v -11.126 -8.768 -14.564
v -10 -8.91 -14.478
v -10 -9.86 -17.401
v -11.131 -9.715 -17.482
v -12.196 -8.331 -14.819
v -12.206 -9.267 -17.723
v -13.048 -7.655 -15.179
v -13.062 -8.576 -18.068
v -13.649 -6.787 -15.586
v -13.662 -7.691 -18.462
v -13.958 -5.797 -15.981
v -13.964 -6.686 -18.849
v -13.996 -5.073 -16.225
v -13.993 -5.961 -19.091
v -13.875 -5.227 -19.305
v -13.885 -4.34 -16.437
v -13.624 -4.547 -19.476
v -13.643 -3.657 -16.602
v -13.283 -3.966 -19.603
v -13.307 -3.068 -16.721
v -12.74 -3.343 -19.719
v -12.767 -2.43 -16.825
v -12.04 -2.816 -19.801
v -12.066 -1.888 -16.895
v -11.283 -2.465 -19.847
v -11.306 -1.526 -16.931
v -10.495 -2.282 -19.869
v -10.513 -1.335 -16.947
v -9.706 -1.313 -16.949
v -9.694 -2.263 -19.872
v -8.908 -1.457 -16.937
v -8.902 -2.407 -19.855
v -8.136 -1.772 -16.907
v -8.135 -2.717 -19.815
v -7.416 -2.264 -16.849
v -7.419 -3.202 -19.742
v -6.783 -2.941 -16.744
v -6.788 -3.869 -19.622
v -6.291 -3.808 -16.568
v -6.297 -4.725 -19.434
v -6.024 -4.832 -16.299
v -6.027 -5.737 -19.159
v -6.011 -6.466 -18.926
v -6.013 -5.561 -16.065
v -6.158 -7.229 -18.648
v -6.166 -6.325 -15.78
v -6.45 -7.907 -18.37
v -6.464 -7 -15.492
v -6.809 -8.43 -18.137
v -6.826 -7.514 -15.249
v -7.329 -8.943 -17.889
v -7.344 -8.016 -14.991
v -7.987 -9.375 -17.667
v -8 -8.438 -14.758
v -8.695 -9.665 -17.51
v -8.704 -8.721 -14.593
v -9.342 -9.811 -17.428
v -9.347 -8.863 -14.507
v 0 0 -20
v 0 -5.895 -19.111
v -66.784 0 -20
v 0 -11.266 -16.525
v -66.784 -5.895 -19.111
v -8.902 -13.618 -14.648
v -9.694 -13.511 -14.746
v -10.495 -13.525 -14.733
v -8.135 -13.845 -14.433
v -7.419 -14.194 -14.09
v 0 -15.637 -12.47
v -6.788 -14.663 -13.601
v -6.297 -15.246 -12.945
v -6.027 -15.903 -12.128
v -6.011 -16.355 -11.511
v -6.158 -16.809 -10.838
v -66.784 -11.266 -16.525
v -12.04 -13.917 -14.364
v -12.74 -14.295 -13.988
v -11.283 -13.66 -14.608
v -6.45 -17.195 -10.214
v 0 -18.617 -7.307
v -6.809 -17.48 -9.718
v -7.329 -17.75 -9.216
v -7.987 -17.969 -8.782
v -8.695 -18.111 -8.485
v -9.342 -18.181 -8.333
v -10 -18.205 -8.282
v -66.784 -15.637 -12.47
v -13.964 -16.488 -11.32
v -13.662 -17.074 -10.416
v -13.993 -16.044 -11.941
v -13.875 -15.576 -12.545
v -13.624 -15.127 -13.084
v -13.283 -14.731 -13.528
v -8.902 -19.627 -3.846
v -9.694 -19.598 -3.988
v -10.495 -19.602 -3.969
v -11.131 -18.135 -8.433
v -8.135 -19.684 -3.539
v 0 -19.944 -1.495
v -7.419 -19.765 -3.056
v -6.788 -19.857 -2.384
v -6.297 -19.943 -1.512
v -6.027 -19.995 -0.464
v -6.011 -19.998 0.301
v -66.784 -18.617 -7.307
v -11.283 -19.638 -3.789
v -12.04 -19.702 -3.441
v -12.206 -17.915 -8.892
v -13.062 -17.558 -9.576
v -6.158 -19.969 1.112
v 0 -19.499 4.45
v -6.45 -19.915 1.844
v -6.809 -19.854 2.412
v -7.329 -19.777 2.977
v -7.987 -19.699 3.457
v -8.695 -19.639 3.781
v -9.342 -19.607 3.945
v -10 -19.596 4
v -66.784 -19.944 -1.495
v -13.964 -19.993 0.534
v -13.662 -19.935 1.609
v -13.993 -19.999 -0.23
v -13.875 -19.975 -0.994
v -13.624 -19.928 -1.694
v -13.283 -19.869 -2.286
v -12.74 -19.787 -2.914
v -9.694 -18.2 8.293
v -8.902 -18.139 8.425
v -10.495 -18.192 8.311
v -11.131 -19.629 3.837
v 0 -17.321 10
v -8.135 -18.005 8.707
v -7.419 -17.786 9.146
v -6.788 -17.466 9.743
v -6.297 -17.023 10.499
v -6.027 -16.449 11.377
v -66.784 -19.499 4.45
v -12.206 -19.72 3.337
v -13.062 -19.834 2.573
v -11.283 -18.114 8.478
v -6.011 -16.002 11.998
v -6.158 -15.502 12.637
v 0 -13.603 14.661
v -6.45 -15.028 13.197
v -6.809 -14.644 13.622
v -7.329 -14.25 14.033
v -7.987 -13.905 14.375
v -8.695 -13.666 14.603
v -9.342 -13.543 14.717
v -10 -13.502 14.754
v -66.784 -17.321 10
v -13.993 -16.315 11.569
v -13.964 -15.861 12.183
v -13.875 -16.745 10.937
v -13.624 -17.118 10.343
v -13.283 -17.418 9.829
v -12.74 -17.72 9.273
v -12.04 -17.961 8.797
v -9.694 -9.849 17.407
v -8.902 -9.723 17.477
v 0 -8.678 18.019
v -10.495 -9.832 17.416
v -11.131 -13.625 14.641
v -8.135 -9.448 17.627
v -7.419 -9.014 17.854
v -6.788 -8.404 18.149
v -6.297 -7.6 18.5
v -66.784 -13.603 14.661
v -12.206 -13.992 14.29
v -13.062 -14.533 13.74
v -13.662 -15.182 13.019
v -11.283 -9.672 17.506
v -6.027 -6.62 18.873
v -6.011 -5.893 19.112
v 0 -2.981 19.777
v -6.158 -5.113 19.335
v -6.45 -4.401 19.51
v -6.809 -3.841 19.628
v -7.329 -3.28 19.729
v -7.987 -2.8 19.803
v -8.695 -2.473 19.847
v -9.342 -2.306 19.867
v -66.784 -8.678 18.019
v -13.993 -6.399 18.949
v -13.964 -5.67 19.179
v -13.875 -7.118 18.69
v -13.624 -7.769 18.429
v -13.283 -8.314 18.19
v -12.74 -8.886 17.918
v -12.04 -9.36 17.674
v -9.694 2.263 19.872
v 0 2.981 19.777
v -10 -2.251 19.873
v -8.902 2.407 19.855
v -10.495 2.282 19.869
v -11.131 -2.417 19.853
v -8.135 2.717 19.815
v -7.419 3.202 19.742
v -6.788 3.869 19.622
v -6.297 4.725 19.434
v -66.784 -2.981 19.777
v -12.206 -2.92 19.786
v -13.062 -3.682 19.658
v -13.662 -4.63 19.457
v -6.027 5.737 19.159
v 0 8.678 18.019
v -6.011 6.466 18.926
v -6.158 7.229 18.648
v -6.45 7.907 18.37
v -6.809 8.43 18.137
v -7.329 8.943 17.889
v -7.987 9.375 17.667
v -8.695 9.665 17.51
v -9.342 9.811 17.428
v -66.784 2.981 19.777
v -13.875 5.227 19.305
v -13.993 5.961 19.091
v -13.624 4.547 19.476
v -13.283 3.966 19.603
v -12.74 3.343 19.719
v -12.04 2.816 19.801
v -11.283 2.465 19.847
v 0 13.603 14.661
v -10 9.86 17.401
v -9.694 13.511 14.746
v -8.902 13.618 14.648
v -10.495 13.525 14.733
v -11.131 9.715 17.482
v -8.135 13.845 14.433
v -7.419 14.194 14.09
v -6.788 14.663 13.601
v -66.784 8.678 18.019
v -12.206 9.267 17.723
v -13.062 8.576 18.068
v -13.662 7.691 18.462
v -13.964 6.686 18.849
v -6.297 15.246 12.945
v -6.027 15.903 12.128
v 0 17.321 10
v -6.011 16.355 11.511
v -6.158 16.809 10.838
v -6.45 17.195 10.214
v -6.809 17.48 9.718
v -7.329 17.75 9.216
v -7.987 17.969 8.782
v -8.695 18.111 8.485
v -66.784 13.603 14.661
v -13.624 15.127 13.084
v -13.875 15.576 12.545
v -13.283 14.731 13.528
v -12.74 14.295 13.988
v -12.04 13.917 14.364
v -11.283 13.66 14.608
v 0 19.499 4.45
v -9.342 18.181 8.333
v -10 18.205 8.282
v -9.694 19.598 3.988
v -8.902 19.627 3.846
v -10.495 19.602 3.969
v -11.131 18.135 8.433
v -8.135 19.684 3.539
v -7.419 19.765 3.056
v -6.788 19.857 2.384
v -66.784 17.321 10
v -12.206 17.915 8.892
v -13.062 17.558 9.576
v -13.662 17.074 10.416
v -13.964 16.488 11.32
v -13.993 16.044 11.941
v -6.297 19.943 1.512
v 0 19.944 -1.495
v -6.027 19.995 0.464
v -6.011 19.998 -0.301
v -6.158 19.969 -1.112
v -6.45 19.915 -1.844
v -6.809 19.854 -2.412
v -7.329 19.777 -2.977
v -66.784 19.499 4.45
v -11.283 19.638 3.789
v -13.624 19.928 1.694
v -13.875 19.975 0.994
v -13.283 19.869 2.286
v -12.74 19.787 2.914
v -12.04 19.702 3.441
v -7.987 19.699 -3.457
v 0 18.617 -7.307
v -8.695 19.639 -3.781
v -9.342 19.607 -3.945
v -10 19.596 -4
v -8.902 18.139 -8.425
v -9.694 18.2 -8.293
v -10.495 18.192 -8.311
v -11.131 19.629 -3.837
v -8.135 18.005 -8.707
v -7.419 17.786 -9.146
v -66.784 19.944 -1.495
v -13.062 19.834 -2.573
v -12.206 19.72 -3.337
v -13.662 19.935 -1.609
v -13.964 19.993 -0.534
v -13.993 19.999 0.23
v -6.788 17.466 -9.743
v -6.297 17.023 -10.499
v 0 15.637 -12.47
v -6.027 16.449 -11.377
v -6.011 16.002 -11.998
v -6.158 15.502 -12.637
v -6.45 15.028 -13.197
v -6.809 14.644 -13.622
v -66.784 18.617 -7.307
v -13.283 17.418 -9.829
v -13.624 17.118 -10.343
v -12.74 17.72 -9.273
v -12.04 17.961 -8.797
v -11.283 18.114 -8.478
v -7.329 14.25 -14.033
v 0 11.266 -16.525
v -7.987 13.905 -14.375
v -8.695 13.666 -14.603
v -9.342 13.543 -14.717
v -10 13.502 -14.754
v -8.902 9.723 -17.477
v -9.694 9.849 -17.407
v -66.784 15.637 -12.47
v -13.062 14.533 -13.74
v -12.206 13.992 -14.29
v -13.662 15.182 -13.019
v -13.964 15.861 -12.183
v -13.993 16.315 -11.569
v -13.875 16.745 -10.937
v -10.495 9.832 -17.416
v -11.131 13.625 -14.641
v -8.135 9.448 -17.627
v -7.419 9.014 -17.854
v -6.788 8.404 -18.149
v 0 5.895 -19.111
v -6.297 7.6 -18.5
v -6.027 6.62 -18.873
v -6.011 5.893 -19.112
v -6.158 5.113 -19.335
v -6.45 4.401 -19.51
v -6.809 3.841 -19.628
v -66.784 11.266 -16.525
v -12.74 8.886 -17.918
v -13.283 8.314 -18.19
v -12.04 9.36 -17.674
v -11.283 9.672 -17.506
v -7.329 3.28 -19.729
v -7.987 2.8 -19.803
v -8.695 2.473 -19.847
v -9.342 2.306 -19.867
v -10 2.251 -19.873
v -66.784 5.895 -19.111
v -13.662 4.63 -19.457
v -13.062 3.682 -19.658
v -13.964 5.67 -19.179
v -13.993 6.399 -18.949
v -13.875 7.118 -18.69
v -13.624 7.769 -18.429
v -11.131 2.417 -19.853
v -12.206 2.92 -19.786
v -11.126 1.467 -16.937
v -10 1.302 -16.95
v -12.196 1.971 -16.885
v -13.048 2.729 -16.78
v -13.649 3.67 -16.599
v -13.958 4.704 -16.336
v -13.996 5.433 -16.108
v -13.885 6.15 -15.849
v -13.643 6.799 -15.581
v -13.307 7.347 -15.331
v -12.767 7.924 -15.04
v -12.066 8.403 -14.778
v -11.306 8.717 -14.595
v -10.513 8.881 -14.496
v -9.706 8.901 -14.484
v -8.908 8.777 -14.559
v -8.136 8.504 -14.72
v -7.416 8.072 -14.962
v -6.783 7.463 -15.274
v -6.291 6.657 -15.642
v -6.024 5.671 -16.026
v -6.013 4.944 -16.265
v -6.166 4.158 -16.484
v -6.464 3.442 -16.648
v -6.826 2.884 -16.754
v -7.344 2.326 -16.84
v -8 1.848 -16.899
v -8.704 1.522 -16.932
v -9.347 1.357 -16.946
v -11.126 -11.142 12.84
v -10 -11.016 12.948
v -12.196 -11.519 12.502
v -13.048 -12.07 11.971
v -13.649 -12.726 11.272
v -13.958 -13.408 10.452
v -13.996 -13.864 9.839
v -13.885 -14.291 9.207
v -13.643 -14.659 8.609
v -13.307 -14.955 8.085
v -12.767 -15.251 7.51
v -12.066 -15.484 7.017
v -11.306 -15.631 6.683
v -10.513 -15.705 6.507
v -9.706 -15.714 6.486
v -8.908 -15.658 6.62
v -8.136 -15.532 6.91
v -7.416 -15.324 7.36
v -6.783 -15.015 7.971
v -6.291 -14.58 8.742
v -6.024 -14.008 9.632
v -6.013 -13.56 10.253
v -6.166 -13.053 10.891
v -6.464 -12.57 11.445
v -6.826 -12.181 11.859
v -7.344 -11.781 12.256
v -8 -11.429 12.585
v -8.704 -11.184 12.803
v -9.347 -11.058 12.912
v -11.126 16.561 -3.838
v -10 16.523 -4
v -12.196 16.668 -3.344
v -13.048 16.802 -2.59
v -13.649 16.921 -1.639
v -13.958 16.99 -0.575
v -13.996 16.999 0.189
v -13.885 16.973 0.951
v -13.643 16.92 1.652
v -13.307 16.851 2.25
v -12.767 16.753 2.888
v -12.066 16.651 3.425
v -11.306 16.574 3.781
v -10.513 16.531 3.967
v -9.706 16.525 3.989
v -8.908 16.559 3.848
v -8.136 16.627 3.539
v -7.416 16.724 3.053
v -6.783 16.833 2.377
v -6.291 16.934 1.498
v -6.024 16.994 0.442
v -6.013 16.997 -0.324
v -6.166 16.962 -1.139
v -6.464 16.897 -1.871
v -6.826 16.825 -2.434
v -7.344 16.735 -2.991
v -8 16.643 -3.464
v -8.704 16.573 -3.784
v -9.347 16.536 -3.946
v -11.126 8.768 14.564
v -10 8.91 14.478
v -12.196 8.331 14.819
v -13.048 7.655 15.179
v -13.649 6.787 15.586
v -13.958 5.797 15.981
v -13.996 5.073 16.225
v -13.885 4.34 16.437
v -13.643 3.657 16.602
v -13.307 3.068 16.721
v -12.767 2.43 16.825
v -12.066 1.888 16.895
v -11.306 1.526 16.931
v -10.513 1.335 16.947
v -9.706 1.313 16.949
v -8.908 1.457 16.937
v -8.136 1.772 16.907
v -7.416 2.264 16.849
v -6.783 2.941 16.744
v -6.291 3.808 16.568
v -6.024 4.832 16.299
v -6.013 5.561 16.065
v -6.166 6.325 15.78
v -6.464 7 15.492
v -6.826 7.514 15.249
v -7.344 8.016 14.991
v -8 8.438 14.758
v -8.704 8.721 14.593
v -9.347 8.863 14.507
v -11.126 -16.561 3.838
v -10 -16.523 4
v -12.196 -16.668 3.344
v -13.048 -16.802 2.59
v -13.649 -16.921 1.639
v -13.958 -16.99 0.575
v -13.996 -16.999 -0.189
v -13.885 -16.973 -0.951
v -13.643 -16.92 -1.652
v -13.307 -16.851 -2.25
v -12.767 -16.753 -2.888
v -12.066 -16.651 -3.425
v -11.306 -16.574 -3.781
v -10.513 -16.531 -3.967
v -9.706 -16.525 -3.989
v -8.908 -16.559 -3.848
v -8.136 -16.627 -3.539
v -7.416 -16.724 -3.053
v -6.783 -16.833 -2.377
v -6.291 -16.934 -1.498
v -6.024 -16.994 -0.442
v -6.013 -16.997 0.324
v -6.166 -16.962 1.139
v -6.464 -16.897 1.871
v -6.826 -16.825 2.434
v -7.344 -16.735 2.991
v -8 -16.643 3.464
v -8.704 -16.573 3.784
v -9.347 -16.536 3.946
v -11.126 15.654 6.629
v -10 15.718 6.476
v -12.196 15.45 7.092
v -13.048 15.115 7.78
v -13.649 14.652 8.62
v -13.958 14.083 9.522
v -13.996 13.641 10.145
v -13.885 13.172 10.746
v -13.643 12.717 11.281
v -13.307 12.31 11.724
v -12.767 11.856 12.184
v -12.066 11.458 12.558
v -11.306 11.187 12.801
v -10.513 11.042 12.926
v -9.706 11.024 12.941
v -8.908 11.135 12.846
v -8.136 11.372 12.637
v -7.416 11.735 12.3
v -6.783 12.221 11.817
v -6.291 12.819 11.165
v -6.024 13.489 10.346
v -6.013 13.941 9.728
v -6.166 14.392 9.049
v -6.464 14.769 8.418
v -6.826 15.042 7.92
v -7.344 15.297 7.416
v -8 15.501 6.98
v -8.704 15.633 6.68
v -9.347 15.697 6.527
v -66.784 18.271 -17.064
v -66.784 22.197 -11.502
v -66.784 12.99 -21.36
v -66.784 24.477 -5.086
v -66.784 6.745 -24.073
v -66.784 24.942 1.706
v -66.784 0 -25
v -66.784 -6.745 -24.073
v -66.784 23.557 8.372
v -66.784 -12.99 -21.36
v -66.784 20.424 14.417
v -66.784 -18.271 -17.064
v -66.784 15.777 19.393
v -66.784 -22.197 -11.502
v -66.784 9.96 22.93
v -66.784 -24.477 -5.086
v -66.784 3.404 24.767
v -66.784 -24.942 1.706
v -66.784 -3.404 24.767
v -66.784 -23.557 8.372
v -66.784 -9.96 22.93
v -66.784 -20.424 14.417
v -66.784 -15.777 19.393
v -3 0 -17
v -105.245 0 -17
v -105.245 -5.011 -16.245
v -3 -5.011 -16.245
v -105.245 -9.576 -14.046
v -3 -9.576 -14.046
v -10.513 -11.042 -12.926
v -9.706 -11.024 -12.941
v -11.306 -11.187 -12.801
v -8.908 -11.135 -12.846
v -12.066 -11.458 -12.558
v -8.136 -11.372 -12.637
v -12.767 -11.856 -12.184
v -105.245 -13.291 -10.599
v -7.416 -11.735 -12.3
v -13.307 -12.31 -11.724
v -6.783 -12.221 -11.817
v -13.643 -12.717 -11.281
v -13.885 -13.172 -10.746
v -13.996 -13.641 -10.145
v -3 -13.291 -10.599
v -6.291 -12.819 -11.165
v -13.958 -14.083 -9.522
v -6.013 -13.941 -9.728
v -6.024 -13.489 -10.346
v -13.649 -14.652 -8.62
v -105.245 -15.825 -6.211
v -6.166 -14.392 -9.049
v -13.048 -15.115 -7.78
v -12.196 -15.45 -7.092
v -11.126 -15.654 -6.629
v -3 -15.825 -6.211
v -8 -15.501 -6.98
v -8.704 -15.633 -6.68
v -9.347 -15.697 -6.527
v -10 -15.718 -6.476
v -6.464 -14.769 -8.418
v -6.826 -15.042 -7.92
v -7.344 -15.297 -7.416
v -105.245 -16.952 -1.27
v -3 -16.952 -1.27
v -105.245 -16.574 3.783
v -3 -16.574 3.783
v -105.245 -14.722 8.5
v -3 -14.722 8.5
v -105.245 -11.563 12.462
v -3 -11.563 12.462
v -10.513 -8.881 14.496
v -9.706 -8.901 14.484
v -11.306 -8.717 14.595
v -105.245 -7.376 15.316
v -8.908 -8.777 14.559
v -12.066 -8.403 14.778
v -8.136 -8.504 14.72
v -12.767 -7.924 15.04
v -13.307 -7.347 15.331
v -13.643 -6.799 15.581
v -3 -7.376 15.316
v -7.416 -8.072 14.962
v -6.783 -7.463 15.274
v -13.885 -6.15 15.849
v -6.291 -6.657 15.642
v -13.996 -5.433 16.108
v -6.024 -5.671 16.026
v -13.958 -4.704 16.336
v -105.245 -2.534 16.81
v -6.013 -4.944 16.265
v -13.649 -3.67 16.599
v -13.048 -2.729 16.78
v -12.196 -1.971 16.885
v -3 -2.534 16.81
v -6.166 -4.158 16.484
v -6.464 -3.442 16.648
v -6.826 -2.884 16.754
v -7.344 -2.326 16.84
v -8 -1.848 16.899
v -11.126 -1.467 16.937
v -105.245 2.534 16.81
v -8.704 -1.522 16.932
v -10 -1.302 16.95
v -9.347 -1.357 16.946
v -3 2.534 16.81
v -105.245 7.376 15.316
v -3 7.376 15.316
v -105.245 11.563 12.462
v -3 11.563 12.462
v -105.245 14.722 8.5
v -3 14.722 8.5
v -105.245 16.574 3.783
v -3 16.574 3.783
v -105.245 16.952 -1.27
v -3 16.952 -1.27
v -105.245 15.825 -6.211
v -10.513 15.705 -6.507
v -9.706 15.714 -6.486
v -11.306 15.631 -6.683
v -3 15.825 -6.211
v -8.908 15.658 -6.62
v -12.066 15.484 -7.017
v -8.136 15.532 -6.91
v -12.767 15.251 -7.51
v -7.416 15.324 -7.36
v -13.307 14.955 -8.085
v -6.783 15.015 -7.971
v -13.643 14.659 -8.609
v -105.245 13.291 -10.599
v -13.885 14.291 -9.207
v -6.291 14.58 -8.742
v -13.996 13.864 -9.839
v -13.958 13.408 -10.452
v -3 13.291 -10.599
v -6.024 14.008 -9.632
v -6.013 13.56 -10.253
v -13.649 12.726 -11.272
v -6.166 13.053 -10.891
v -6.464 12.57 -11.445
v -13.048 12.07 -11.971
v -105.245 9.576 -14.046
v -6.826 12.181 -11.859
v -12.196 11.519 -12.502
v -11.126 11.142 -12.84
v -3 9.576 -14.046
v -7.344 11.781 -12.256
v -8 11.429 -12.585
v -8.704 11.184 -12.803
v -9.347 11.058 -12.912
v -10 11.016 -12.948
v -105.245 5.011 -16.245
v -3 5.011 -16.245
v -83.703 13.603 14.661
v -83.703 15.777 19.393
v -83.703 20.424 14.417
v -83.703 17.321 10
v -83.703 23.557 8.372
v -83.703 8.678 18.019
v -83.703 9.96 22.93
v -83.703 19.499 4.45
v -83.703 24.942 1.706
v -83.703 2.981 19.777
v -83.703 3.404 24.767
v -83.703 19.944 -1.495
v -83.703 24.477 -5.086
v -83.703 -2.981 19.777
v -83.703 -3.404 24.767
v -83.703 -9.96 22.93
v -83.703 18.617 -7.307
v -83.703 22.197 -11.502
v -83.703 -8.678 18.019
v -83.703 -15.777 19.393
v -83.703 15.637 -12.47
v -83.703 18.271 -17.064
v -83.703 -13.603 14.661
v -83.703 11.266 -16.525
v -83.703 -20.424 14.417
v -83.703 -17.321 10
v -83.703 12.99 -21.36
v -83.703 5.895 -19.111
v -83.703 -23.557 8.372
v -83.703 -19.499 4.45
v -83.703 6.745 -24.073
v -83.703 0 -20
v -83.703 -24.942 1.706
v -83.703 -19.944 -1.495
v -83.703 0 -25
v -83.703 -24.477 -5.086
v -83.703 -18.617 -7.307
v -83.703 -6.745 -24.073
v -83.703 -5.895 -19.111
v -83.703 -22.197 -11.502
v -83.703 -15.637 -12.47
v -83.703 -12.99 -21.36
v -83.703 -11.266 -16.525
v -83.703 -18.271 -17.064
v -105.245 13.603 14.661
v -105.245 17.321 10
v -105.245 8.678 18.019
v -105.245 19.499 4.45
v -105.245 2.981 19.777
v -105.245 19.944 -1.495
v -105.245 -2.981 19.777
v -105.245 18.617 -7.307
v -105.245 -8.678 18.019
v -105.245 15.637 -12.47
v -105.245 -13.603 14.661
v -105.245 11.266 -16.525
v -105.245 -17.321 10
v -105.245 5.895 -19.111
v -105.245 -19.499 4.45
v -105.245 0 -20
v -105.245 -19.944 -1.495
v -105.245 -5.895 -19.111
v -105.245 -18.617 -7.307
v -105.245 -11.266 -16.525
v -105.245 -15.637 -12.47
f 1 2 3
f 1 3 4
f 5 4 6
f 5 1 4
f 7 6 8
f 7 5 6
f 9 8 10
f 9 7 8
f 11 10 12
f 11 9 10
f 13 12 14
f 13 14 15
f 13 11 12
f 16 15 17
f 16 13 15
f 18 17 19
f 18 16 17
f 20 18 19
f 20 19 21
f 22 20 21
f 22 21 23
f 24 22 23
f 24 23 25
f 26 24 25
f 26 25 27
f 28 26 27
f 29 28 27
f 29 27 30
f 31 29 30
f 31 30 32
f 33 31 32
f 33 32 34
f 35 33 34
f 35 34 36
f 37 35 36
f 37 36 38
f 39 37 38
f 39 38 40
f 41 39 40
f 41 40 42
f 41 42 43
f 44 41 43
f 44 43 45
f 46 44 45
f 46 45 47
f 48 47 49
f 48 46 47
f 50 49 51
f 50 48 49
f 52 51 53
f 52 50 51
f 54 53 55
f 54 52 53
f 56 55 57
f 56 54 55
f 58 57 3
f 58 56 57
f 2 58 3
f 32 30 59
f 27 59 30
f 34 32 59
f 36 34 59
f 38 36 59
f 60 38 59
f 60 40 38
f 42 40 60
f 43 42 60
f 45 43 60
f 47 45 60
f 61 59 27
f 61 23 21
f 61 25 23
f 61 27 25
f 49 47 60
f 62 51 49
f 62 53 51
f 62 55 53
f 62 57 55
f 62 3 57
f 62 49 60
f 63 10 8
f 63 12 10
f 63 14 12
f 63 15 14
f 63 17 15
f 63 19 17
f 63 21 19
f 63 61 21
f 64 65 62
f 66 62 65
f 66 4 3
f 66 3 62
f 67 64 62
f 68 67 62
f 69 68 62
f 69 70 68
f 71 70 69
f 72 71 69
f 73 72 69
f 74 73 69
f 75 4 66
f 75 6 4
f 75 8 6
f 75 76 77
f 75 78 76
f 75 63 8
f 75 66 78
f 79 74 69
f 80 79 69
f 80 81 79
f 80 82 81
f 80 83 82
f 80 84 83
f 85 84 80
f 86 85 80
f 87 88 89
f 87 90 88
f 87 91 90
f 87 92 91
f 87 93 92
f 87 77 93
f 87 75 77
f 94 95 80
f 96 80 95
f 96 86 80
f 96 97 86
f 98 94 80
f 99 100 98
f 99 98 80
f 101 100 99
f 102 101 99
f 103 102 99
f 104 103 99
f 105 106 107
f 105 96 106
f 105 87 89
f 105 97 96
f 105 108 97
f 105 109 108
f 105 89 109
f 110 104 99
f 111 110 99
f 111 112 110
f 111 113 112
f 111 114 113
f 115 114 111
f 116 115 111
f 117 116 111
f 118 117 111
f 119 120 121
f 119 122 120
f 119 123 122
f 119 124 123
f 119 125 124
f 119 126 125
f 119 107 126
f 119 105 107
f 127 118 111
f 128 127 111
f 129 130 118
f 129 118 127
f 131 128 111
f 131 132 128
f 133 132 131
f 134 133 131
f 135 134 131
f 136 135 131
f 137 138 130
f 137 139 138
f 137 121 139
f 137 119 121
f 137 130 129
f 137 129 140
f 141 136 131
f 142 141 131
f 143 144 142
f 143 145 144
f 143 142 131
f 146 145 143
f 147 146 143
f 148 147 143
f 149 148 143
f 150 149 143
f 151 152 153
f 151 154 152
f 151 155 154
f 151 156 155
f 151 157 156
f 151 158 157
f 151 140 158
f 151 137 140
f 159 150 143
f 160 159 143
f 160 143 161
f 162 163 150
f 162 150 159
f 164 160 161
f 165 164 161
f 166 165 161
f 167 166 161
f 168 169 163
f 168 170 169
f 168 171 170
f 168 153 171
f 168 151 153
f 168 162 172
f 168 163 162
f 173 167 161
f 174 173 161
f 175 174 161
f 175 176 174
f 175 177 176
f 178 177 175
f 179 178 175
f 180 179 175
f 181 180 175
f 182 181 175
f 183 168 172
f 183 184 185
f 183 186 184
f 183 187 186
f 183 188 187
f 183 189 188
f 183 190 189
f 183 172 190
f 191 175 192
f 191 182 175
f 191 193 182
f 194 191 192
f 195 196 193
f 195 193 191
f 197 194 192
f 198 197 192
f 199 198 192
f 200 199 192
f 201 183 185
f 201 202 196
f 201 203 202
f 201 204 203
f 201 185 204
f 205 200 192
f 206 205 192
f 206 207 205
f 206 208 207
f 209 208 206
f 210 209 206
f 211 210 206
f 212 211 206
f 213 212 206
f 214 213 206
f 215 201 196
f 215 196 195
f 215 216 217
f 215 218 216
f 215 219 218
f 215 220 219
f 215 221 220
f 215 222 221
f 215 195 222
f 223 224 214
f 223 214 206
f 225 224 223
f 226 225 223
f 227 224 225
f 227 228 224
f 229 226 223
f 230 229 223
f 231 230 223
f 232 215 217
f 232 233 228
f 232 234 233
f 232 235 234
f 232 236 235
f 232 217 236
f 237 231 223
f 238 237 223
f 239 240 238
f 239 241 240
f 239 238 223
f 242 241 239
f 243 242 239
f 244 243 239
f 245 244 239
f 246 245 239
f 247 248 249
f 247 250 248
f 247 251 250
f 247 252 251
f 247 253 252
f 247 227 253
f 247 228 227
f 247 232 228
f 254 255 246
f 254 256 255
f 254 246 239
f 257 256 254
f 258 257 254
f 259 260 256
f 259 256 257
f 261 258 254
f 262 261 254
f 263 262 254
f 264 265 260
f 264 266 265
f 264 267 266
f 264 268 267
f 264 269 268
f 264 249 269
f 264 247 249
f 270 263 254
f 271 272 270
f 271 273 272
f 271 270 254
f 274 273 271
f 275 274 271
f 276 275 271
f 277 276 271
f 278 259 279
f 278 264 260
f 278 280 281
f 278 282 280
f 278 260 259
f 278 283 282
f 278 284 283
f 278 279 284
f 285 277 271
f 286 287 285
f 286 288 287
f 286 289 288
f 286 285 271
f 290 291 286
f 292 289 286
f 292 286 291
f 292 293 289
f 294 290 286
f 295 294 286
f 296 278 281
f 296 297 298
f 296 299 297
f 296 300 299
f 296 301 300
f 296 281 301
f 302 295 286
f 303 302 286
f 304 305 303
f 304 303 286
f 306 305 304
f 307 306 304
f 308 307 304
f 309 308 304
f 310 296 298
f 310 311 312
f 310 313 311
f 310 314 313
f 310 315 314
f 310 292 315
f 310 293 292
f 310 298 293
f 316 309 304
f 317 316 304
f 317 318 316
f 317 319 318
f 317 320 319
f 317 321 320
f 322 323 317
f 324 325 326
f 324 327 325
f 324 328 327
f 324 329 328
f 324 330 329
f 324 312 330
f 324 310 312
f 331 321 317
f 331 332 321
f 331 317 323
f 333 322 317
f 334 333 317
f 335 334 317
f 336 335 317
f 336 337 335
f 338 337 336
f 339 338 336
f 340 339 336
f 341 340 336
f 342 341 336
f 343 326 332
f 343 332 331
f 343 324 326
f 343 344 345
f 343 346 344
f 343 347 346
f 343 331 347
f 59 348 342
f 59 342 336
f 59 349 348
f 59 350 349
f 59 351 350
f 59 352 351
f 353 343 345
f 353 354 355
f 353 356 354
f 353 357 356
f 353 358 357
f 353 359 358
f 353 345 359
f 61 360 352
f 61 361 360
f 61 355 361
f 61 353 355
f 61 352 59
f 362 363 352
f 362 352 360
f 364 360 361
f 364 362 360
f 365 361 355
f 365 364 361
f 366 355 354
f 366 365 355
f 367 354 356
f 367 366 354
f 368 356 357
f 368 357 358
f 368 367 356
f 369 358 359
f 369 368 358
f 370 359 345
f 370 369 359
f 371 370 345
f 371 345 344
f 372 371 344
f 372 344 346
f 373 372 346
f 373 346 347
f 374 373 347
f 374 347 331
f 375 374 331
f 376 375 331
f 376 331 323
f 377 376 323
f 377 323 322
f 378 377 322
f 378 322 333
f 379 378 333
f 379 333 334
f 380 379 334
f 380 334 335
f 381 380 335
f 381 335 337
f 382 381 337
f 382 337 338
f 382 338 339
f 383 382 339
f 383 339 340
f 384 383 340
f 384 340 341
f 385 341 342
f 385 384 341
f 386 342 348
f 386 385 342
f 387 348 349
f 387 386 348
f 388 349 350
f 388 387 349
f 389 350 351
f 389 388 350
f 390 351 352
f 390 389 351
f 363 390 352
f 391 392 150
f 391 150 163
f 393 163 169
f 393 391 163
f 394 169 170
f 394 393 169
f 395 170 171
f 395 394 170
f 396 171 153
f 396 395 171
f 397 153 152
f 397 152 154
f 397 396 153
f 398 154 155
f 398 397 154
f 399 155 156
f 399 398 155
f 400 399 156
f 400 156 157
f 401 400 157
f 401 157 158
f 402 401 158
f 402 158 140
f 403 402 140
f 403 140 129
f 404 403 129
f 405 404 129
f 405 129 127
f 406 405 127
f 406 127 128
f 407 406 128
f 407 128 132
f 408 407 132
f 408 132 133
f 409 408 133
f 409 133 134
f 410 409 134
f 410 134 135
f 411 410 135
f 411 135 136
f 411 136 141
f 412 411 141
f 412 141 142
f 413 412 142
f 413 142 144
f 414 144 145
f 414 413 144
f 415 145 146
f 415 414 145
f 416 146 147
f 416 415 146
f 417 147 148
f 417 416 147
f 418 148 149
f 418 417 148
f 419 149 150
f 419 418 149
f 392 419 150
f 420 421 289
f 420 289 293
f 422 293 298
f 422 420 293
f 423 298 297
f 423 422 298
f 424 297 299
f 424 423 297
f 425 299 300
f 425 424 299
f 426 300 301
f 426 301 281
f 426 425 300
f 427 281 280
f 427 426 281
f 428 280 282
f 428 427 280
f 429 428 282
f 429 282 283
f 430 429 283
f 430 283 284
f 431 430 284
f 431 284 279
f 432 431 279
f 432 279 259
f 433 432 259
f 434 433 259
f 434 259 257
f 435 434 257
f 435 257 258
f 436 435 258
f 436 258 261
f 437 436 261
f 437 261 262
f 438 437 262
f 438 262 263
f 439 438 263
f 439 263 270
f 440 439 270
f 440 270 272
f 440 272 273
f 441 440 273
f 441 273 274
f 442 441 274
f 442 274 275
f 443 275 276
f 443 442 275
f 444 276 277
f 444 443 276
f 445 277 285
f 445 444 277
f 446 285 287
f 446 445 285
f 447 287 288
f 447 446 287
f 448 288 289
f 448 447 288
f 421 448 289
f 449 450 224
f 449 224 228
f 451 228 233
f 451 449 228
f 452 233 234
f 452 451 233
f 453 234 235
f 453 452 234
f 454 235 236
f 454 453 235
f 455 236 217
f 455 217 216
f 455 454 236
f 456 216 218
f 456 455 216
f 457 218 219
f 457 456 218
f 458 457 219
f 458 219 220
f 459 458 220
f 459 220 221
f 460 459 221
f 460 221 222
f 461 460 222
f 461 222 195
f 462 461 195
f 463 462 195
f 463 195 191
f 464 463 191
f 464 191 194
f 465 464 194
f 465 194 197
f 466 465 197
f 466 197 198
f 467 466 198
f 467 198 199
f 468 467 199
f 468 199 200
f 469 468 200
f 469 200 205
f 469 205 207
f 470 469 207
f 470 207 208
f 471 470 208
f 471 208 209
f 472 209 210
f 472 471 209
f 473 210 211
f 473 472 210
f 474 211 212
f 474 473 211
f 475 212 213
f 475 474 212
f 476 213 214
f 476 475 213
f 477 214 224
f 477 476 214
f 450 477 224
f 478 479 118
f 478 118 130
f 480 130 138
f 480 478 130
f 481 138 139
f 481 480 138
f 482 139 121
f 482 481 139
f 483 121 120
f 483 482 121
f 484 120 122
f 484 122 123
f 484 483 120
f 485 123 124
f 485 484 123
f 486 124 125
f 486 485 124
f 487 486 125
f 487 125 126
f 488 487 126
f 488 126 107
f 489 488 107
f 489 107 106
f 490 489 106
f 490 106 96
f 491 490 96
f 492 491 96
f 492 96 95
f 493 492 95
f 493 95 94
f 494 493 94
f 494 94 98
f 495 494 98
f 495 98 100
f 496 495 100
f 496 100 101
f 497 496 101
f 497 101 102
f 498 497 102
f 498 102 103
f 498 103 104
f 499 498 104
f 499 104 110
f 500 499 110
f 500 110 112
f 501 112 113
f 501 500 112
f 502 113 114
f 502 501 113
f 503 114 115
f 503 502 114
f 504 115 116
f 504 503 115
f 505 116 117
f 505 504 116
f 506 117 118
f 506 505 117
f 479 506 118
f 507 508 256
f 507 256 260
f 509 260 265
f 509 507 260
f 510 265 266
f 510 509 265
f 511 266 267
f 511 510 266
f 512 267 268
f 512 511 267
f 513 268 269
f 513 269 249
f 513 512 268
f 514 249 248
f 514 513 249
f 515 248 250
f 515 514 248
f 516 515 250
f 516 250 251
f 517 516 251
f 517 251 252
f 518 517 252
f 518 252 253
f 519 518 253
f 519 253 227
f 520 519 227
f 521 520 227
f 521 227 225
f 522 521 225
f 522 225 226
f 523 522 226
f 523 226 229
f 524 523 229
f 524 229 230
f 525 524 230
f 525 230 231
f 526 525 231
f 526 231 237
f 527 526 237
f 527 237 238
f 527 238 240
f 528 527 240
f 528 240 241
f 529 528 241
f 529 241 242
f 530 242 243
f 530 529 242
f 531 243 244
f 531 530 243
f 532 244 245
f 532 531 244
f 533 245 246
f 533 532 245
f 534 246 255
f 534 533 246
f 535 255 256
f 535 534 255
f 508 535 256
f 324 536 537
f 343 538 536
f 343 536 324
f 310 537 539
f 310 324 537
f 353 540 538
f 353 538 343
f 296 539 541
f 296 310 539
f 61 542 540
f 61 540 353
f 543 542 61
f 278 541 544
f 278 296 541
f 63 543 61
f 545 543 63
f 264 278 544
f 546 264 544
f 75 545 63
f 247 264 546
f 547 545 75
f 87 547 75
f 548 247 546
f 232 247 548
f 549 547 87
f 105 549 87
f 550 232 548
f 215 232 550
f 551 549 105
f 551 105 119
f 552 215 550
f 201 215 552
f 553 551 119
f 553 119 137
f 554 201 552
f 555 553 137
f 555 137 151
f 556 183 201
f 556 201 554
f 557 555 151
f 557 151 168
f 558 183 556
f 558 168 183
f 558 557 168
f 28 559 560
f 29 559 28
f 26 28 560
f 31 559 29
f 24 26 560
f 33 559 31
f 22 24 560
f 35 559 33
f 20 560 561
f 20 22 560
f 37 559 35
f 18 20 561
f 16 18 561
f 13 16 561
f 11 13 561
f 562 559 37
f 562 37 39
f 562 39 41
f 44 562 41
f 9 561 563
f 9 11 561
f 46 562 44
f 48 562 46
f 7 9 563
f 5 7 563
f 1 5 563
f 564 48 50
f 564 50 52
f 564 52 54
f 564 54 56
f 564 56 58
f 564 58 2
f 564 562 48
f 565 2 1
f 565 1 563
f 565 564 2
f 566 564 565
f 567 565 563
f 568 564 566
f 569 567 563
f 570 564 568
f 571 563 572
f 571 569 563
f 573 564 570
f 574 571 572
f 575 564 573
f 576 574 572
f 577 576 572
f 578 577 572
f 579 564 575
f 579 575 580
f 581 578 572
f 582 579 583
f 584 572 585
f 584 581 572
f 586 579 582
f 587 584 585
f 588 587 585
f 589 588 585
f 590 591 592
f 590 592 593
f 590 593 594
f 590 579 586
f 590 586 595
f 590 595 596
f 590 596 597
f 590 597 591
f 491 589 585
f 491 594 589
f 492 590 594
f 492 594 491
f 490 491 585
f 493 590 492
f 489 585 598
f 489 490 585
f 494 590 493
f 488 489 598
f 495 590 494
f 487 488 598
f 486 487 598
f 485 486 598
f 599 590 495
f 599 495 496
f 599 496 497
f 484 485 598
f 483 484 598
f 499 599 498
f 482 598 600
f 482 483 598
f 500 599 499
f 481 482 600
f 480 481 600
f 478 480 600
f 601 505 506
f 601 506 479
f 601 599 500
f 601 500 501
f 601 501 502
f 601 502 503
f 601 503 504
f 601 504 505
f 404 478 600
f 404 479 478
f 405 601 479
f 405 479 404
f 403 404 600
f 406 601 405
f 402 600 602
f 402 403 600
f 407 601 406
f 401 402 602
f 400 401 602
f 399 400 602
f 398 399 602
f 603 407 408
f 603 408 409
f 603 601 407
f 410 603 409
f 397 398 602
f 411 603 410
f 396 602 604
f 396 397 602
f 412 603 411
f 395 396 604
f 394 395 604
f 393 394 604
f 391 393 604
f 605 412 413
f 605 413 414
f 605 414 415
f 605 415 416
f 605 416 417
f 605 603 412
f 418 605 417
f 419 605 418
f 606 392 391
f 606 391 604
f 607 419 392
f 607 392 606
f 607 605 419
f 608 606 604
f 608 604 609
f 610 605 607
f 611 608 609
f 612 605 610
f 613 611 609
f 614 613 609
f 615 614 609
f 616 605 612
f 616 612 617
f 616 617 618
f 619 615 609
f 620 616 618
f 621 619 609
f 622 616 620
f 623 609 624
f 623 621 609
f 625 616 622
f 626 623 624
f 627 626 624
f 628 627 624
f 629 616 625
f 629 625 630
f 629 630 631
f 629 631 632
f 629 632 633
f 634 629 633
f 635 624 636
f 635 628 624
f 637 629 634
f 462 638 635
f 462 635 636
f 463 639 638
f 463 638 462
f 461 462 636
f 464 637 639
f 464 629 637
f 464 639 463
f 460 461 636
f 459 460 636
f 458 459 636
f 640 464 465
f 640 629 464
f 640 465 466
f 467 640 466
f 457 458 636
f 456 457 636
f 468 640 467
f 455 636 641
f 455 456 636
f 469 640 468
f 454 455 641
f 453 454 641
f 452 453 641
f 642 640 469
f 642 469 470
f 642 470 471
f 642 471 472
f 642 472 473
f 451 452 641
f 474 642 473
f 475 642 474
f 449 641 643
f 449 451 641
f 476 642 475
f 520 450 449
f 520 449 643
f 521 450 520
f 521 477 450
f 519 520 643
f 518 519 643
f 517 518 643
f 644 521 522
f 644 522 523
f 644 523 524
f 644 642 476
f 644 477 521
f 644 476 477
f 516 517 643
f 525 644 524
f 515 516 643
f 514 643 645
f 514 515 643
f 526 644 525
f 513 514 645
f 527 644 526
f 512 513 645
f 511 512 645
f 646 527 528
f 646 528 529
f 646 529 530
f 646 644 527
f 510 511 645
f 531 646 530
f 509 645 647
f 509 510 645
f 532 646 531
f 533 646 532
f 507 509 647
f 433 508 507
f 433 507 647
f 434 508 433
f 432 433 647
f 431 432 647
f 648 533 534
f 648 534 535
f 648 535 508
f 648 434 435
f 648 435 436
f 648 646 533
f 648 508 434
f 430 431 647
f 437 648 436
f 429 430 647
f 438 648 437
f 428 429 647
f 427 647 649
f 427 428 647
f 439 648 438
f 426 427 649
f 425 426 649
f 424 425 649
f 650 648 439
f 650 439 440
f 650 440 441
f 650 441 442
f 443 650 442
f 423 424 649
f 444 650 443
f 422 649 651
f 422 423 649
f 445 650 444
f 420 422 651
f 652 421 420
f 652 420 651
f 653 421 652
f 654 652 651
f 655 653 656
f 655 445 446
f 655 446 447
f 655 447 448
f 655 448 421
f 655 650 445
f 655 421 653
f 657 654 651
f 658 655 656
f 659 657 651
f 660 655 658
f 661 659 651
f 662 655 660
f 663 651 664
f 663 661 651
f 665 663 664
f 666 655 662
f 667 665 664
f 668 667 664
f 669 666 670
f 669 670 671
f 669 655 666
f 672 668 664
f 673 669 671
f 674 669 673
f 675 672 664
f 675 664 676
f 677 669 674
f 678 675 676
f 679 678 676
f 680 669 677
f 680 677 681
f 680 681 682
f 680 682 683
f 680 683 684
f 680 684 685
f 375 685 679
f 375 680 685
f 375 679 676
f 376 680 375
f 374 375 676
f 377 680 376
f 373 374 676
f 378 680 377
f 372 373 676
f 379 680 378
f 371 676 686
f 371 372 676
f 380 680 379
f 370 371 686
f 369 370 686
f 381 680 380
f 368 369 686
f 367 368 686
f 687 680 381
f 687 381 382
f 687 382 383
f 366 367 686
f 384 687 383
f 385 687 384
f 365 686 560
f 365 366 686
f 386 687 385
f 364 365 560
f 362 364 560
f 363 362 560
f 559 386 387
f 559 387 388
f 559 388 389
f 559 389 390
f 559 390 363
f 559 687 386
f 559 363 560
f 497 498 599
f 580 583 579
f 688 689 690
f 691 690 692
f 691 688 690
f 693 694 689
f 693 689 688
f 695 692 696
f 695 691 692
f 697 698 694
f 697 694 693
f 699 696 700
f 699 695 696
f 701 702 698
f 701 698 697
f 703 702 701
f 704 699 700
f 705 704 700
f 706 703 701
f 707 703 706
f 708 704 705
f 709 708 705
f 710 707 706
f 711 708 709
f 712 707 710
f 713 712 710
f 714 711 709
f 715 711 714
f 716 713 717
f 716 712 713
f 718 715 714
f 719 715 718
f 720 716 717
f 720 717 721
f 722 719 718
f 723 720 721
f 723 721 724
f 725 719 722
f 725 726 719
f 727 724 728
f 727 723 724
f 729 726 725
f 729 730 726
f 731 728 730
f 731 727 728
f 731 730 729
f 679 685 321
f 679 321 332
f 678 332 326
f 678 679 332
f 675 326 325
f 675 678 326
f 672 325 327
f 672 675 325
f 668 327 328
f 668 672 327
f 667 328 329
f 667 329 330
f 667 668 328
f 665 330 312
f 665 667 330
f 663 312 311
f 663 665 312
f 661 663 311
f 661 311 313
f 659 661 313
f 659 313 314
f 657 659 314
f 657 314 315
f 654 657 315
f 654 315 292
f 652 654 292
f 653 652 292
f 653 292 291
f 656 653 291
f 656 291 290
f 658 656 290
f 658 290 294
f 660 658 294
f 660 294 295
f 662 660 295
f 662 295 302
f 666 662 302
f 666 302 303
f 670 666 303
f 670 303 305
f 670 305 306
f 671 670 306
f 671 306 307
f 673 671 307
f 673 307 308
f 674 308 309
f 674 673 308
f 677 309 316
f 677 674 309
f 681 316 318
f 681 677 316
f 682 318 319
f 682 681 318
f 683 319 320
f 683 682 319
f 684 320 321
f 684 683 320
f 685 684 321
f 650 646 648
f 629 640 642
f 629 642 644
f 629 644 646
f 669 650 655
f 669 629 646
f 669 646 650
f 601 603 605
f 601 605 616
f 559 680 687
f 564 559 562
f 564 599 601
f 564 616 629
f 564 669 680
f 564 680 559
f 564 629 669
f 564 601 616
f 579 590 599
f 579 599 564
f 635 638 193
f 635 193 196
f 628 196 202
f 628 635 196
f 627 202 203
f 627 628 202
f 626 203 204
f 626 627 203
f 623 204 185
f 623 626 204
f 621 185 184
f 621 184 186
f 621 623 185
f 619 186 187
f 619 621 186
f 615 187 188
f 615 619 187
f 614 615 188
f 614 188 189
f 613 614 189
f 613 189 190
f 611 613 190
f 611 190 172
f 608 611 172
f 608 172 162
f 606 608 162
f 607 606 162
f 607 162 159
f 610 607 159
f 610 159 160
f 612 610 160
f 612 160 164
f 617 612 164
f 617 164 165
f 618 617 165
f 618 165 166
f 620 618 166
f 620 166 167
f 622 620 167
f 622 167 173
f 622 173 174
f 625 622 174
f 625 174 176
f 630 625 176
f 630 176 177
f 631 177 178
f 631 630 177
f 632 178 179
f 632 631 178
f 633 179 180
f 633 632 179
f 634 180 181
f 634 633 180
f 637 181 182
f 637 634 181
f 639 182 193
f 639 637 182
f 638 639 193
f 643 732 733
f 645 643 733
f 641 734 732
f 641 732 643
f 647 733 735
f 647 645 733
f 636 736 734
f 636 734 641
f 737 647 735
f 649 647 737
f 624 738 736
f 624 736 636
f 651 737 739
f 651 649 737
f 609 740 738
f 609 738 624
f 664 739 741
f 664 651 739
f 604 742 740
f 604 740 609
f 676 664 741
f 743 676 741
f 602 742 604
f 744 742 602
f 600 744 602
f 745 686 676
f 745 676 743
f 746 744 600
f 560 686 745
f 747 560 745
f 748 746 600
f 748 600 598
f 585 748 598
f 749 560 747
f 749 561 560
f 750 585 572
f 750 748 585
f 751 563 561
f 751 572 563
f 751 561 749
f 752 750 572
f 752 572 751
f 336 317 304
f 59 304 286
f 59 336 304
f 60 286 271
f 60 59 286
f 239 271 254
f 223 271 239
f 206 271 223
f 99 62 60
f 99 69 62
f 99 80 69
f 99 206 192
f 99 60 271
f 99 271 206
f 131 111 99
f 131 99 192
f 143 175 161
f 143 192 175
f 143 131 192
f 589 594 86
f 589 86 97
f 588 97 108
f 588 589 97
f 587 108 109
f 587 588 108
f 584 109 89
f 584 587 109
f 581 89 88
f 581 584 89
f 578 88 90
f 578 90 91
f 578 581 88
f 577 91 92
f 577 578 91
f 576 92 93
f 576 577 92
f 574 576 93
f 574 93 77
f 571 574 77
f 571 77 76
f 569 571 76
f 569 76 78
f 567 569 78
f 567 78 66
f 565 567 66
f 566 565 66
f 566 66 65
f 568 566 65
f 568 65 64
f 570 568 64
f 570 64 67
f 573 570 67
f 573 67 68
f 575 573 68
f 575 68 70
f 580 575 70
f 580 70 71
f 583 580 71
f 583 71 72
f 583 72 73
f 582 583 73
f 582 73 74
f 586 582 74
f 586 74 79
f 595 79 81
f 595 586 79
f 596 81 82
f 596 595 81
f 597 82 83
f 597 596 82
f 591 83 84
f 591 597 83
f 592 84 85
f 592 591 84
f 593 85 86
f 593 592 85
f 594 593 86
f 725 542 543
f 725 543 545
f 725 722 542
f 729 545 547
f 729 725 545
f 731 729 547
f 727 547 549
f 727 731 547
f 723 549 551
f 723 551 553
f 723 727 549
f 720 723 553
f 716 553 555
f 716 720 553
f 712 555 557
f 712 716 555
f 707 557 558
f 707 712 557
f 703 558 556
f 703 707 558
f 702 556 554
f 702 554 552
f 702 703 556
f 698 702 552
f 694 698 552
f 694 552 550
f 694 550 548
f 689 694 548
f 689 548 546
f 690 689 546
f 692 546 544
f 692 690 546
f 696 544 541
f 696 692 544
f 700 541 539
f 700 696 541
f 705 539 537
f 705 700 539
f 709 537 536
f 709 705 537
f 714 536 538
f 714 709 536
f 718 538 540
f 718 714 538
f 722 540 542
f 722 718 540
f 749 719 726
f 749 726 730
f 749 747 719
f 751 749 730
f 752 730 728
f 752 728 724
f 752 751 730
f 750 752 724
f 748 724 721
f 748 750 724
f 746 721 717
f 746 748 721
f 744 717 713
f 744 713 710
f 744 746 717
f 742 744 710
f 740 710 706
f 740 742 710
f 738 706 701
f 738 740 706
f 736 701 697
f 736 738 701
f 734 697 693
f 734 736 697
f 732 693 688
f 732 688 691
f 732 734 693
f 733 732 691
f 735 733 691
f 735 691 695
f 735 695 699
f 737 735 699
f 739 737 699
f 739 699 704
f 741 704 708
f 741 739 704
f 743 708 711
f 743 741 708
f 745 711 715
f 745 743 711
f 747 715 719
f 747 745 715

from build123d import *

# Parameters (mm, degrees)
CUT_EXTRUDE1_REACH      = 113.025
CUT_EXTRUDE1_END_RADIUS = 20
SKETCH2_R               = 4
CIRPATTERN1_COUNT       = 10


with BuildPart() as part:
    # Sketch1 → Revolve1 (revolve)
    with BuildSketch(Plane.XY, mode=Mode.PRIVATE) as revolve1_sk:
        Polygon((0, 0), (0, 20), (-66.784359743, 20), (-66.784359743, 25), (-83.702975636, 25), (-83.702975636, 20), (-105.24487755, 20), (-105.24487755, 17), (-3, 17), (-3, 0), align=None)
    revolve(revolve1_sk.sketch.rotate(Axis((27.57498519, 0, 0), (-1, 0, 0)), 90), axis=Axis((27.57498519, 0, 0), (-1, 0, 0)))

    # Cut-Extrude1: up to this cylinder (the profile starts inside it)
    cut_extrude1_end = Plane(origin=(-10, 0, 0), z_dir=(1, 0, 0)) * Cylinder(CUT_EXTRUDE1_END_RADIUS, 267.05, mode=Mode.PRIVATE)
    # Sketch2 → Cut-Extrude1 (cut, up to the surface)
    with BuildSketch(Plane(origin=(0, 0, 0), x_dir=(1, 0, 0), z_dir=(0, 1, 0)), mode=Mode.PRIVATE) as cut_extrude1_sk1:
        with Locations(Location((-10, 0, 0), (0, 0, 90))):
            Circle(SKETCH2_R)
    cut_extrude1_tool1 = extrude(cut_extrude1_sk1.sketch, amount=CUT_EXTRUDE1_REACH, mode=Mode.PRIVATE) & cut_extrude1_end
    cut_extrude1 = cut_extrude1_tool1.solids().sort_by_distance((-10, 0, 0))[0]
    add(cut_extrude1, mode=Mode.SUBTRACT)

    # CirPattern1: Cut-Extrude1 ×10 about axis
    cirpattern1_axis = Axis((27.57498519, 0, 0), (-1, 0, 0))
    for i in range(1, CIRPATTERN1_COUNT):
        add(cut_extrude1.rotate(cirpattern1_axis, i * 360 / CIRPATTERN1_COUNT), mode=Mode.SUBTRACT)


solid = part.part
